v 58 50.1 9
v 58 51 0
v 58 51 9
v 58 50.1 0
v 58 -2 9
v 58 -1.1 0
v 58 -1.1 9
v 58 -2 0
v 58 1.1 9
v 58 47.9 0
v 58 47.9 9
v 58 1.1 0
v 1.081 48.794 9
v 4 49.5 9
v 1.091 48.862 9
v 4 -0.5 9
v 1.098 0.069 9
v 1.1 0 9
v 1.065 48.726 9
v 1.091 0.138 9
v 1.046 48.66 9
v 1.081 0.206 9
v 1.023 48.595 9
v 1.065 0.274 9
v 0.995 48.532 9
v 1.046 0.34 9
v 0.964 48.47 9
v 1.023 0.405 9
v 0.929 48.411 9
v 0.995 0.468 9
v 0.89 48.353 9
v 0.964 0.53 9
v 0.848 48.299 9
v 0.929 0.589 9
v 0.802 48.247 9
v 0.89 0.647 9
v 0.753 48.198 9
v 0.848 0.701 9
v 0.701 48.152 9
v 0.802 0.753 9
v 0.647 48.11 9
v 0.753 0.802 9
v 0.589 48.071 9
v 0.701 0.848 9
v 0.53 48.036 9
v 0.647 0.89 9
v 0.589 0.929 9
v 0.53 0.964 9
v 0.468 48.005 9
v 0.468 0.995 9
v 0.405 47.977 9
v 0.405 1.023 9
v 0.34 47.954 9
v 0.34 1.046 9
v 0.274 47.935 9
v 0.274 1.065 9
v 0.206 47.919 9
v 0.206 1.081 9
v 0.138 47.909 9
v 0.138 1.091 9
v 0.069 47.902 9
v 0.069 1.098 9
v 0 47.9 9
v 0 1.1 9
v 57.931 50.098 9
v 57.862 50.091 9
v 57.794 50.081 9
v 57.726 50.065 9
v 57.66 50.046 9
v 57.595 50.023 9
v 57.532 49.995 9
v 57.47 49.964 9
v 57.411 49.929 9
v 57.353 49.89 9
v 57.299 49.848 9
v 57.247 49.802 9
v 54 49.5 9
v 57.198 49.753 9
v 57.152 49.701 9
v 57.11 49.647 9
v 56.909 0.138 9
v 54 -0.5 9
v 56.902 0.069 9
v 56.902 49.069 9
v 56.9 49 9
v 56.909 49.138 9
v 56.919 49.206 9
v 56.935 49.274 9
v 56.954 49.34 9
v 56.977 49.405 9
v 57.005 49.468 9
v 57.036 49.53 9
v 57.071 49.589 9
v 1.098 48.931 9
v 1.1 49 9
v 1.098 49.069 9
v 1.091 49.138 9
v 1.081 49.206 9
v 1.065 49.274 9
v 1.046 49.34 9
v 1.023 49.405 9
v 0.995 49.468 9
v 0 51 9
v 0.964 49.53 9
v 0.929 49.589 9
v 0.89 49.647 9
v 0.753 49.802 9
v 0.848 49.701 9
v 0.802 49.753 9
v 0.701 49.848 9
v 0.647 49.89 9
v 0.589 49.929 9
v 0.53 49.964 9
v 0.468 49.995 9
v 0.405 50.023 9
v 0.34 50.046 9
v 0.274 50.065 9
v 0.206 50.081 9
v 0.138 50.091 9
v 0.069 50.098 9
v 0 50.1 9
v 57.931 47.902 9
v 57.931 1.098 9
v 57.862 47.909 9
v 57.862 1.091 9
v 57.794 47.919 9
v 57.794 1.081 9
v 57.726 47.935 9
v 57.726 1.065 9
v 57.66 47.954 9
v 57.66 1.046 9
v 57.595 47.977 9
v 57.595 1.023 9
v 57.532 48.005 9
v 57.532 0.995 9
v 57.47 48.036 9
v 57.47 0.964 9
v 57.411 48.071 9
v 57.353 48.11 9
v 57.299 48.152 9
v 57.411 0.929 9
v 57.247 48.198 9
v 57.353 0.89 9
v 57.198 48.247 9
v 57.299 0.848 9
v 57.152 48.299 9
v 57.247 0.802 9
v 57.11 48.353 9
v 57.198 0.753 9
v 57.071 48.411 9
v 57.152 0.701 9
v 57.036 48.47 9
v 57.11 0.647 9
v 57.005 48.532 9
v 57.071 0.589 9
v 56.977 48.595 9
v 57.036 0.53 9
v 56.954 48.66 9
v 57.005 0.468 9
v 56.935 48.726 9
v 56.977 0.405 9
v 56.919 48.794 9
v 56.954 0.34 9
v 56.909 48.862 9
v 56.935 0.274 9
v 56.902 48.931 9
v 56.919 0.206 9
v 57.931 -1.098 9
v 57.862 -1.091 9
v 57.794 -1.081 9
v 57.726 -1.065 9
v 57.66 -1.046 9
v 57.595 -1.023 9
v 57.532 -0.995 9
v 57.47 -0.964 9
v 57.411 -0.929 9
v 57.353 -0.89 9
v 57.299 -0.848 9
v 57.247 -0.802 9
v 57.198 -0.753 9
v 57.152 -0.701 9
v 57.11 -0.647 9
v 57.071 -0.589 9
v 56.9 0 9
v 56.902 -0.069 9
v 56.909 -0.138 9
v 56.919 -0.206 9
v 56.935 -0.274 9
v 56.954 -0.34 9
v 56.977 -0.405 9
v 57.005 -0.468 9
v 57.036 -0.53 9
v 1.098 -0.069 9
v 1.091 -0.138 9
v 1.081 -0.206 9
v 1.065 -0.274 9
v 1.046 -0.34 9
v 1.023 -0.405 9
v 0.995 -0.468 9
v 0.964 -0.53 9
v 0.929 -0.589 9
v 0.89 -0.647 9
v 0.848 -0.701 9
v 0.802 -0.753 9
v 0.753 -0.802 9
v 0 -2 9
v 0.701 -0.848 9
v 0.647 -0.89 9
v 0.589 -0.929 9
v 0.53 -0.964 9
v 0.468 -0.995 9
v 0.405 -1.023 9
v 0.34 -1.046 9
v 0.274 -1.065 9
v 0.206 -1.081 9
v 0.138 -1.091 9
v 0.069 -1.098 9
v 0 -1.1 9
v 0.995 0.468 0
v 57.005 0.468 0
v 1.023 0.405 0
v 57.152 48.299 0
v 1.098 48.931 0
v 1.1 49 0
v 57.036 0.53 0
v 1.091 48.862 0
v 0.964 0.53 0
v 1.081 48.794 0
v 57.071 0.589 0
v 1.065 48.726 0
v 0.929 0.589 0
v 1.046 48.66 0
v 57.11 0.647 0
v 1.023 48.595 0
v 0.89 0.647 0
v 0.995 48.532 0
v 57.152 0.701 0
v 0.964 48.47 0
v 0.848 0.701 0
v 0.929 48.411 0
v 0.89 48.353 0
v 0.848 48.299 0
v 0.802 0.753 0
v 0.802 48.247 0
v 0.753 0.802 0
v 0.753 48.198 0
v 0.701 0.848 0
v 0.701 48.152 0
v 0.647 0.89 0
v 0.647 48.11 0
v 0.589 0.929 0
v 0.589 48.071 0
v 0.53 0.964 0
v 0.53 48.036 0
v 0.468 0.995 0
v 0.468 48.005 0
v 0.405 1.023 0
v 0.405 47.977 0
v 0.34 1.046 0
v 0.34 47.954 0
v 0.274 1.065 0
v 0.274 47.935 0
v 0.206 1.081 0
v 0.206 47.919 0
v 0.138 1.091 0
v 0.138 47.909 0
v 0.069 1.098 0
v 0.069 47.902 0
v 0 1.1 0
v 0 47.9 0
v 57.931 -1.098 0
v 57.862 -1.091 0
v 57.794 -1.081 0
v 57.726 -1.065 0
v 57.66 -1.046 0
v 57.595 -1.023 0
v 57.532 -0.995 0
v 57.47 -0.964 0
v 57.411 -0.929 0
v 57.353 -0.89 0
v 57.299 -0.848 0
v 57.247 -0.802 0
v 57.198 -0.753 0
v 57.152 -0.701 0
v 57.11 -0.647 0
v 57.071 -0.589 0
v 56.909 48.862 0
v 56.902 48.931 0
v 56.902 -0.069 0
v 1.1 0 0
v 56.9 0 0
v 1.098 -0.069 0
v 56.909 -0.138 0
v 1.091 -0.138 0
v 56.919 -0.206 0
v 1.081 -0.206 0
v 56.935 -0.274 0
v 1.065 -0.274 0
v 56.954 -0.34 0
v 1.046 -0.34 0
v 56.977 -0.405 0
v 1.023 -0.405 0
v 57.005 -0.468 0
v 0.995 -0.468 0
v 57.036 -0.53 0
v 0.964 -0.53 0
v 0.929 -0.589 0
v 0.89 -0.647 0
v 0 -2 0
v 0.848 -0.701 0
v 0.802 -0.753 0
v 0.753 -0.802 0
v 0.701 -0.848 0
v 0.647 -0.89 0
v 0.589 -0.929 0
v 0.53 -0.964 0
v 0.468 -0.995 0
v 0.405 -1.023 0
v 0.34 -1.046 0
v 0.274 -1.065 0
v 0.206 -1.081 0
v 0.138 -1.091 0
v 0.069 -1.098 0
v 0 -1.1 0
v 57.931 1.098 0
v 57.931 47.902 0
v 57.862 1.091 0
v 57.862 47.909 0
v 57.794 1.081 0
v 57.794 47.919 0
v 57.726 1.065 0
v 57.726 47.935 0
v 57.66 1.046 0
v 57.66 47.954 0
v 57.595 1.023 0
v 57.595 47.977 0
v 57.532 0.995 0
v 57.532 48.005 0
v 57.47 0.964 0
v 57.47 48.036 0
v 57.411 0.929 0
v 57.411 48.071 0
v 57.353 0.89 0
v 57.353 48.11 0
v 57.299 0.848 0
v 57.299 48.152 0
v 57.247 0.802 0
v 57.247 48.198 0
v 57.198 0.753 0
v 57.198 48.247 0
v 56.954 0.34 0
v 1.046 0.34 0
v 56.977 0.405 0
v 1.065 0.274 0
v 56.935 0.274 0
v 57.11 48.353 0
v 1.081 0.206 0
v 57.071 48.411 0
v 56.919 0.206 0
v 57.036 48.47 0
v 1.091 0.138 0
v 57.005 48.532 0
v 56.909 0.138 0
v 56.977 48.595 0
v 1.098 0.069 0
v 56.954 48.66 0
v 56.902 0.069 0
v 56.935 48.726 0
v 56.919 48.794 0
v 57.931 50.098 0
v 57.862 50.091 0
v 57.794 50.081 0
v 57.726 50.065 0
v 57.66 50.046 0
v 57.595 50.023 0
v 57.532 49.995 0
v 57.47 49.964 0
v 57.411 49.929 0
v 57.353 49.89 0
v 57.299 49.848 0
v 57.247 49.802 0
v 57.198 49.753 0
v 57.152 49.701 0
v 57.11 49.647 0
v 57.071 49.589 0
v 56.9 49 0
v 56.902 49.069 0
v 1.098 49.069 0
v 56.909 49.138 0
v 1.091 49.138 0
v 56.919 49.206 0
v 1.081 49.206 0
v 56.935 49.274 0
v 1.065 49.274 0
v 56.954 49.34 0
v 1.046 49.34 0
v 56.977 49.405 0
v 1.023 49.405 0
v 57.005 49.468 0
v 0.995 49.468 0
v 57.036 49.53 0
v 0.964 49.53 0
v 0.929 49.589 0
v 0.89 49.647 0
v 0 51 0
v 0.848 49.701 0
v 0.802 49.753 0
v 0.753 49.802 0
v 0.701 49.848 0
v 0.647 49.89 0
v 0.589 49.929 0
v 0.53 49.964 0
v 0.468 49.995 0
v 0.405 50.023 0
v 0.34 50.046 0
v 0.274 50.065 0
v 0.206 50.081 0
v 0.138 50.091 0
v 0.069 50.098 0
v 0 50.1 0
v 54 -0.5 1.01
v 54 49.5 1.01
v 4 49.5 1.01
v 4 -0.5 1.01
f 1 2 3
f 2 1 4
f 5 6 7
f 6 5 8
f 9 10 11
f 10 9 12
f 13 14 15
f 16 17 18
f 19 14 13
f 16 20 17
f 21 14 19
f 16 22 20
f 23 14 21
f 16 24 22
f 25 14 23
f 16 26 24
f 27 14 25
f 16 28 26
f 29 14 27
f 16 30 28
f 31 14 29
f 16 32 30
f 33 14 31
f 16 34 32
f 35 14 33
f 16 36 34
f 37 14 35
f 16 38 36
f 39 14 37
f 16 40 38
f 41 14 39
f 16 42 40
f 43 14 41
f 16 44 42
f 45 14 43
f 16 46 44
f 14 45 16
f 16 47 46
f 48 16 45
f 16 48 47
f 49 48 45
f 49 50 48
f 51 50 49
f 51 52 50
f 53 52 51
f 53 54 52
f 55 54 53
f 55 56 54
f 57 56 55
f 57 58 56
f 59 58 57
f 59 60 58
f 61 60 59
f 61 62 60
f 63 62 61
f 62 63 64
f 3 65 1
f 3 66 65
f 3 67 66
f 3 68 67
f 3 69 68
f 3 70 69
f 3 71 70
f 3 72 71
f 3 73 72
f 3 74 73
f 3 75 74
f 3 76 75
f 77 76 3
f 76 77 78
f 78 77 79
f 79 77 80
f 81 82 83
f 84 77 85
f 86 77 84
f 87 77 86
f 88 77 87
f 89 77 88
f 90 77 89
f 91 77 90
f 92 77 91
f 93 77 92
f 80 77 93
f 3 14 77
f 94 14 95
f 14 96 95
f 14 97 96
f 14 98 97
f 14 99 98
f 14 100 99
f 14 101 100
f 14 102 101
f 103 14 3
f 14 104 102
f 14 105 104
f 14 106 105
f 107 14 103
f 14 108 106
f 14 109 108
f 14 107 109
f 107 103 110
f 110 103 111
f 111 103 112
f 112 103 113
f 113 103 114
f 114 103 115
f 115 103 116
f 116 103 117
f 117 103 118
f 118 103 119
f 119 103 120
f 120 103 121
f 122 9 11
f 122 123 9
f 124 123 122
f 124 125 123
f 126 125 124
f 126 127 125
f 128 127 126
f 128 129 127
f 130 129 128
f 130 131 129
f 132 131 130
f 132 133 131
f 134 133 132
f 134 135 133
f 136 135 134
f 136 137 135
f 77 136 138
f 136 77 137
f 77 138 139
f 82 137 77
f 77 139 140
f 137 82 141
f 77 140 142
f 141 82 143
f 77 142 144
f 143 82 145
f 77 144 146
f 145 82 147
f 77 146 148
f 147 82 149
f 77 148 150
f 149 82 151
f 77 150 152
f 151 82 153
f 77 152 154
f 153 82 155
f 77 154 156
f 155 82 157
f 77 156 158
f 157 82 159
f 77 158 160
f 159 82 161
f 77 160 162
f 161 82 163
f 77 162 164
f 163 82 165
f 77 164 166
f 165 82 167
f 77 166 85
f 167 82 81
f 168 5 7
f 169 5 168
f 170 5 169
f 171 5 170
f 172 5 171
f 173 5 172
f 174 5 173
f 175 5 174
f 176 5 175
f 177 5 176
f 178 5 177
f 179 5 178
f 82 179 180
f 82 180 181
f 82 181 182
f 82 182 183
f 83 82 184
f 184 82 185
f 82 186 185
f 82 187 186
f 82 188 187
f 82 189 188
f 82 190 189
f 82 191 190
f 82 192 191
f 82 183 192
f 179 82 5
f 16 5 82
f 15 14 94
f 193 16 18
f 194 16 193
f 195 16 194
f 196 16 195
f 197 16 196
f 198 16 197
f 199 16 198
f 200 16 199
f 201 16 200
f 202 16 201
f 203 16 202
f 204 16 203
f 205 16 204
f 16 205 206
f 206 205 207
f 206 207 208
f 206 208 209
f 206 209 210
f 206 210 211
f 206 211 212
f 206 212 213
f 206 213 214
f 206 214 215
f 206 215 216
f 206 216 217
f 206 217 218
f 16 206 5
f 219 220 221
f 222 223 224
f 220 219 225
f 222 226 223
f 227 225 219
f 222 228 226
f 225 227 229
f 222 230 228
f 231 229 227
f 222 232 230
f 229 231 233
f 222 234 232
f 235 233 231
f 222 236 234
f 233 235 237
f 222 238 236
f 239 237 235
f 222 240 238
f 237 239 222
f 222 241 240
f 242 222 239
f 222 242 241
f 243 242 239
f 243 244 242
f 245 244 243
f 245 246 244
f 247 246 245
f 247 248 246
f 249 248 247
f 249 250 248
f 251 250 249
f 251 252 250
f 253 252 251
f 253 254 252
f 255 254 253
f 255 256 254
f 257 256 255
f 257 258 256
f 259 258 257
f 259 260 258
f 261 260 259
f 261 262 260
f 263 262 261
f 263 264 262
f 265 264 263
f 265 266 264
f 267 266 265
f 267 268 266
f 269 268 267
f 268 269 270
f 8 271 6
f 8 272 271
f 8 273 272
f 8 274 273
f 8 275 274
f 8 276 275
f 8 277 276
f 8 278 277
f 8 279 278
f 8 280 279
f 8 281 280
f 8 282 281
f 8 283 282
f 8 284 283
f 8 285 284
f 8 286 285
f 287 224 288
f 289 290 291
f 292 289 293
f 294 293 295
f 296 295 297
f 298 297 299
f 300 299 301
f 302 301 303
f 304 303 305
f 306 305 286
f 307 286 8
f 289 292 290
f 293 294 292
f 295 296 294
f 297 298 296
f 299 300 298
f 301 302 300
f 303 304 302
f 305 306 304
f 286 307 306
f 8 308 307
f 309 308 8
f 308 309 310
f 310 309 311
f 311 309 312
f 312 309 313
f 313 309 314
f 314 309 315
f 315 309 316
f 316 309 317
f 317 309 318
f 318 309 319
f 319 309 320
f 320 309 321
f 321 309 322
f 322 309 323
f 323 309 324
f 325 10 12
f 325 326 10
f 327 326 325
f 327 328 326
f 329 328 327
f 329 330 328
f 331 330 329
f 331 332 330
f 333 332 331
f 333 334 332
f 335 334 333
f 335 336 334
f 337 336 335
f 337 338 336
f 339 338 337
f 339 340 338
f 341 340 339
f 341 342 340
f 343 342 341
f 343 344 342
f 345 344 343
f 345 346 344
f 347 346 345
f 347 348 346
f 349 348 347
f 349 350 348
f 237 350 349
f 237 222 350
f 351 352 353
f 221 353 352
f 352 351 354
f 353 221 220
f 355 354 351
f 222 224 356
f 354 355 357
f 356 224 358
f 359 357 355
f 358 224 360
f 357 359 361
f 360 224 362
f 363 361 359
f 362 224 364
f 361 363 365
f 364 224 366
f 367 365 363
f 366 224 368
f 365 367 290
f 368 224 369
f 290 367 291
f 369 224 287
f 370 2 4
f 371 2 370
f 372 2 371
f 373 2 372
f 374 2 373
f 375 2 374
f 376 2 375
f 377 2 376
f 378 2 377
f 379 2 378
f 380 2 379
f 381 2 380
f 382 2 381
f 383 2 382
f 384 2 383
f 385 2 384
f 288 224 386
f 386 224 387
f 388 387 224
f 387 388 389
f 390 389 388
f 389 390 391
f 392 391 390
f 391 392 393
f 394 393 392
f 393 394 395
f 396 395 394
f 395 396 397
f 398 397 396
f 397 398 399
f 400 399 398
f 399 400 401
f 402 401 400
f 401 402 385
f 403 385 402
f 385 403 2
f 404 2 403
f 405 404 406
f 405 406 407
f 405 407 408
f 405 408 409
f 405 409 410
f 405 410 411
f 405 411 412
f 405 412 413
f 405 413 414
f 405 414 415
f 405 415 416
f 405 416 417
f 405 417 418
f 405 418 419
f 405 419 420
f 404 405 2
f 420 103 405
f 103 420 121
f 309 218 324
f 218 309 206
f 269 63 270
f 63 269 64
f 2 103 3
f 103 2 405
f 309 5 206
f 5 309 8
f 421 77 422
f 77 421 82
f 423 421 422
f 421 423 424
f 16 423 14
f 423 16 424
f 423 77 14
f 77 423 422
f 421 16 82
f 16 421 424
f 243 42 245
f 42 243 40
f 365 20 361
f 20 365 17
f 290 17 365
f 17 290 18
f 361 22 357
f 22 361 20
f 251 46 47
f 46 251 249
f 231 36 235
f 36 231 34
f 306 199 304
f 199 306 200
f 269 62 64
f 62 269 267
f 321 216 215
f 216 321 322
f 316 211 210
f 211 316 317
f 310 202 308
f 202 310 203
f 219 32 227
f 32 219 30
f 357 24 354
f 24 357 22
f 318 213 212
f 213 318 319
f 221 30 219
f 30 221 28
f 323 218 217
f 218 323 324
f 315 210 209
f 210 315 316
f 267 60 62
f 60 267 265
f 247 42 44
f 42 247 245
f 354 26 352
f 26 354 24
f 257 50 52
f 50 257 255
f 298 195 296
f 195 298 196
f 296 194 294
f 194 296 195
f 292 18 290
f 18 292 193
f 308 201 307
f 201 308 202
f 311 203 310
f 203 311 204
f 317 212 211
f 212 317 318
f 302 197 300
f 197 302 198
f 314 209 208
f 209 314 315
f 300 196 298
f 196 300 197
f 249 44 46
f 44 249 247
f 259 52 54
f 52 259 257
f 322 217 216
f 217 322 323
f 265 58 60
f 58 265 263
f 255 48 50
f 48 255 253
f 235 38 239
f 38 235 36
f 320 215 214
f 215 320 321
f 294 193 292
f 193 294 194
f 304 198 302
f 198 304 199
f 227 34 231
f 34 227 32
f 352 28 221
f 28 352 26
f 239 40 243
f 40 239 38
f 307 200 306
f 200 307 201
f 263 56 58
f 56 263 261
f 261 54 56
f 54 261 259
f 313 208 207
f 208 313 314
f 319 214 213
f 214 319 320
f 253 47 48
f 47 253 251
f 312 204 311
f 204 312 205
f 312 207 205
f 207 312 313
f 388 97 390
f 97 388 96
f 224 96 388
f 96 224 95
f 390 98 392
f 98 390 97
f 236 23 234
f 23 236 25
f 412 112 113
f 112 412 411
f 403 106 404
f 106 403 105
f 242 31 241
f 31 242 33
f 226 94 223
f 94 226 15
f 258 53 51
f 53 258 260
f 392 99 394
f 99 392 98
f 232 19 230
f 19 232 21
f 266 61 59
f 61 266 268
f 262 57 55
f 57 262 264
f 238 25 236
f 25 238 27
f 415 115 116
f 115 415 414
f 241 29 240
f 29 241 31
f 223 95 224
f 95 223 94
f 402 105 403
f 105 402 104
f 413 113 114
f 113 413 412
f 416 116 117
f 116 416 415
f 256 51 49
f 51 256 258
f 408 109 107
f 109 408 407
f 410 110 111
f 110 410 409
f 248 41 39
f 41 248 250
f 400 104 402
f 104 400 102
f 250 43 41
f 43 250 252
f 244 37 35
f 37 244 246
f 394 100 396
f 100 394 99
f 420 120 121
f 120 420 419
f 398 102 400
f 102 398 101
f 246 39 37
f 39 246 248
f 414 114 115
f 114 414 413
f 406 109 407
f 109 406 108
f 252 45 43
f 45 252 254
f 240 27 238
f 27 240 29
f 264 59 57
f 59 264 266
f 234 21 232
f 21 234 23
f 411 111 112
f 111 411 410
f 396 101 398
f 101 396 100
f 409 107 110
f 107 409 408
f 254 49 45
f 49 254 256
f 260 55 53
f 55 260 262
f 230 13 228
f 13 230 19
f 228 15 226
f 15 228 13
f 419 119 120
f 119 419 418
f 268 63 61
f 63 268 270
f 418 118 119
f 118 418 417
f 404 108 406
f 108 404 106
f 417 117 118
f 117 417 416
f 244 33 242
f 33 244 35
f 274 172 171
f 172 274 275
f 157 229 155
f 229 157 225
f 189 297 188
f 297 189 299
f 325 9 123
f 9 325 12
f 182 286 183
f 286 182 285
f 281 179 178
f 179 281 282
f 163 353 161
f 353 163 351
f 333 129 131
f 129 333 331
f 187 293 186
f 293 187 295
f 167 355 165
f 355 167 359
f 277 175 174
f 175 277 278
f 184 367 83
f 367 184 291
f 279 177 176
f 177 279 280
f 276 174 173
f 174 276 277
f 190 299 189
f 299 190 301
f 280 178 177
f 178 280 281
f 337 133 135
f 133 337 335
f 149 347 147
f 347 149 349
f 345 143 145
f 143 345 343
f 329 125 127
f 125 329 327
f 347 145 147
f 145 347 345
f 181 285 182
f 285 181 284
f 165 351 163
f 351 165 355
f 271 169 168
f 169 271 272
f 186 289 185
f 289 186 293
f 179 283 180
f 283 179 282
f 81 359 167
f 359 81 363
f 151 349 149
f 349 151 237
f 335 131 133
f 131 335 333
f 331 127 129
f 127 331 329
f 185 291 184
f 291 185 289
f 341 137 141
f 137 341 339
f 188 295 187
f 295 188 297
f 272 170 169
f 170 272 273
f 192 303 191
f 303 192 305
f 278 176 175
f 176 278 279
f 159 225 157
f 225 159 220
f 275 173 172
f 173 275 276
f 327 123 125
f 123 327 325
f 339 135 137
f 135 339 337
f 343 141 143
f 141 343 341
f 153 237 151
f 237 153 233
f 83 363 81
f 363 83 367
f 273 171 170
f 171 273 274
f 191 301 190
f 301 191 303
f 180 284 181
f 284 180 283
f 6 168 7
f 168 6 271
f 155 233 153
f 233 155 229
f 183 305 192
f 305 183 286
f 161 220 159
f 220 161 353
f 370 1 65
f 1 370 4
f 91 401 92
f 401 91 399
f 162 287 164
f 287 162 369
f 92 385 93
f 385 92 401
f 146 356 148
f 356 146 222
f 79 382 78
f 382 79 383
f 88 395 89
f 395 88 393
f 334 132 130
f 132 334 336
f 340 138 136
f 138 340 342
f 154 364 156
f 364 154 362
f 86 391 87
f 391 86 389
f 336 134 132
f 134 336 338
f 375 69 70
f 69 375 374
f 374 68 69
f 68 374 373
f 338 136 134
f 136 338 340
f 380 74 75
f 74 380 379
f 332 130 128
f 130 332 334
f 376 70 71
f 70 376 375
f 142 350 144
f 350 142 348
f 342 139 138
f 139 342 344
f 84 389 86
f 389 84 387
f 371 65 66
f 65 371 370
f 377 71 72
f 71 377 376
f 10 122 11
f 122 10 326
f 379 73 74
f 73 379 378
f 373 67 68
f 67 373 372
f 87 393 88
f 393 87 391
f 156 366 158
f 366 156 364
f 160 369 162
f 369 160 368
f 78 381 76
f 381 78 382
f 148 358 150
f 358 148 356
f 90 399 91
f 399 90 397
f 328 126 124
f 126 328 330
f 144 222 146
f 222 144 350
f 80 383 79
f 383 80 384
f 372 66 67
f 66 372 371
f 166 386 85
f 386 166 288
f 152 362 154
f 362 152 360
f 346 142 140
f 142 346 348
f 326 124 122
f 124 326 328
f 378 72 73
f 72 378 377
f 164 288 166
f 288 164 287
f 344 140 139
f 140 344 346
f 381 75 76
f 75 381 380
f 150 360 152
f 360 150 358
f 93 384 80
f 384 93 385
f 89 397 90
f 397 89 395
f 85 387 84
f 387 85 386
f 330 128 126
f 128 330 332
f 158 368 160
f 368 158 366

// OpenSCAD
$fn = 100;

rpix = 58;
rpiy = 49;
rpiz = 17;

rpiri = 1;
rpiro = 3;

buf = 10;

module mount(x,y){
	translate([x,y,-1]) cylinder(r1=rpiri+0.1, r2=rpiri+0.1, h=buf+0.01);
}

difference(){
	translate([0, -2, 0]) cube([rpix, rpiy+4, buf-1]);
	translate([4, -0.5, 1.01]) cube([50, 50, buf-1]);
	mount(0, 0);
	mount(0, rpiy);
	mount(rpix, 0);
	mount(rpix, rpiy);
}
